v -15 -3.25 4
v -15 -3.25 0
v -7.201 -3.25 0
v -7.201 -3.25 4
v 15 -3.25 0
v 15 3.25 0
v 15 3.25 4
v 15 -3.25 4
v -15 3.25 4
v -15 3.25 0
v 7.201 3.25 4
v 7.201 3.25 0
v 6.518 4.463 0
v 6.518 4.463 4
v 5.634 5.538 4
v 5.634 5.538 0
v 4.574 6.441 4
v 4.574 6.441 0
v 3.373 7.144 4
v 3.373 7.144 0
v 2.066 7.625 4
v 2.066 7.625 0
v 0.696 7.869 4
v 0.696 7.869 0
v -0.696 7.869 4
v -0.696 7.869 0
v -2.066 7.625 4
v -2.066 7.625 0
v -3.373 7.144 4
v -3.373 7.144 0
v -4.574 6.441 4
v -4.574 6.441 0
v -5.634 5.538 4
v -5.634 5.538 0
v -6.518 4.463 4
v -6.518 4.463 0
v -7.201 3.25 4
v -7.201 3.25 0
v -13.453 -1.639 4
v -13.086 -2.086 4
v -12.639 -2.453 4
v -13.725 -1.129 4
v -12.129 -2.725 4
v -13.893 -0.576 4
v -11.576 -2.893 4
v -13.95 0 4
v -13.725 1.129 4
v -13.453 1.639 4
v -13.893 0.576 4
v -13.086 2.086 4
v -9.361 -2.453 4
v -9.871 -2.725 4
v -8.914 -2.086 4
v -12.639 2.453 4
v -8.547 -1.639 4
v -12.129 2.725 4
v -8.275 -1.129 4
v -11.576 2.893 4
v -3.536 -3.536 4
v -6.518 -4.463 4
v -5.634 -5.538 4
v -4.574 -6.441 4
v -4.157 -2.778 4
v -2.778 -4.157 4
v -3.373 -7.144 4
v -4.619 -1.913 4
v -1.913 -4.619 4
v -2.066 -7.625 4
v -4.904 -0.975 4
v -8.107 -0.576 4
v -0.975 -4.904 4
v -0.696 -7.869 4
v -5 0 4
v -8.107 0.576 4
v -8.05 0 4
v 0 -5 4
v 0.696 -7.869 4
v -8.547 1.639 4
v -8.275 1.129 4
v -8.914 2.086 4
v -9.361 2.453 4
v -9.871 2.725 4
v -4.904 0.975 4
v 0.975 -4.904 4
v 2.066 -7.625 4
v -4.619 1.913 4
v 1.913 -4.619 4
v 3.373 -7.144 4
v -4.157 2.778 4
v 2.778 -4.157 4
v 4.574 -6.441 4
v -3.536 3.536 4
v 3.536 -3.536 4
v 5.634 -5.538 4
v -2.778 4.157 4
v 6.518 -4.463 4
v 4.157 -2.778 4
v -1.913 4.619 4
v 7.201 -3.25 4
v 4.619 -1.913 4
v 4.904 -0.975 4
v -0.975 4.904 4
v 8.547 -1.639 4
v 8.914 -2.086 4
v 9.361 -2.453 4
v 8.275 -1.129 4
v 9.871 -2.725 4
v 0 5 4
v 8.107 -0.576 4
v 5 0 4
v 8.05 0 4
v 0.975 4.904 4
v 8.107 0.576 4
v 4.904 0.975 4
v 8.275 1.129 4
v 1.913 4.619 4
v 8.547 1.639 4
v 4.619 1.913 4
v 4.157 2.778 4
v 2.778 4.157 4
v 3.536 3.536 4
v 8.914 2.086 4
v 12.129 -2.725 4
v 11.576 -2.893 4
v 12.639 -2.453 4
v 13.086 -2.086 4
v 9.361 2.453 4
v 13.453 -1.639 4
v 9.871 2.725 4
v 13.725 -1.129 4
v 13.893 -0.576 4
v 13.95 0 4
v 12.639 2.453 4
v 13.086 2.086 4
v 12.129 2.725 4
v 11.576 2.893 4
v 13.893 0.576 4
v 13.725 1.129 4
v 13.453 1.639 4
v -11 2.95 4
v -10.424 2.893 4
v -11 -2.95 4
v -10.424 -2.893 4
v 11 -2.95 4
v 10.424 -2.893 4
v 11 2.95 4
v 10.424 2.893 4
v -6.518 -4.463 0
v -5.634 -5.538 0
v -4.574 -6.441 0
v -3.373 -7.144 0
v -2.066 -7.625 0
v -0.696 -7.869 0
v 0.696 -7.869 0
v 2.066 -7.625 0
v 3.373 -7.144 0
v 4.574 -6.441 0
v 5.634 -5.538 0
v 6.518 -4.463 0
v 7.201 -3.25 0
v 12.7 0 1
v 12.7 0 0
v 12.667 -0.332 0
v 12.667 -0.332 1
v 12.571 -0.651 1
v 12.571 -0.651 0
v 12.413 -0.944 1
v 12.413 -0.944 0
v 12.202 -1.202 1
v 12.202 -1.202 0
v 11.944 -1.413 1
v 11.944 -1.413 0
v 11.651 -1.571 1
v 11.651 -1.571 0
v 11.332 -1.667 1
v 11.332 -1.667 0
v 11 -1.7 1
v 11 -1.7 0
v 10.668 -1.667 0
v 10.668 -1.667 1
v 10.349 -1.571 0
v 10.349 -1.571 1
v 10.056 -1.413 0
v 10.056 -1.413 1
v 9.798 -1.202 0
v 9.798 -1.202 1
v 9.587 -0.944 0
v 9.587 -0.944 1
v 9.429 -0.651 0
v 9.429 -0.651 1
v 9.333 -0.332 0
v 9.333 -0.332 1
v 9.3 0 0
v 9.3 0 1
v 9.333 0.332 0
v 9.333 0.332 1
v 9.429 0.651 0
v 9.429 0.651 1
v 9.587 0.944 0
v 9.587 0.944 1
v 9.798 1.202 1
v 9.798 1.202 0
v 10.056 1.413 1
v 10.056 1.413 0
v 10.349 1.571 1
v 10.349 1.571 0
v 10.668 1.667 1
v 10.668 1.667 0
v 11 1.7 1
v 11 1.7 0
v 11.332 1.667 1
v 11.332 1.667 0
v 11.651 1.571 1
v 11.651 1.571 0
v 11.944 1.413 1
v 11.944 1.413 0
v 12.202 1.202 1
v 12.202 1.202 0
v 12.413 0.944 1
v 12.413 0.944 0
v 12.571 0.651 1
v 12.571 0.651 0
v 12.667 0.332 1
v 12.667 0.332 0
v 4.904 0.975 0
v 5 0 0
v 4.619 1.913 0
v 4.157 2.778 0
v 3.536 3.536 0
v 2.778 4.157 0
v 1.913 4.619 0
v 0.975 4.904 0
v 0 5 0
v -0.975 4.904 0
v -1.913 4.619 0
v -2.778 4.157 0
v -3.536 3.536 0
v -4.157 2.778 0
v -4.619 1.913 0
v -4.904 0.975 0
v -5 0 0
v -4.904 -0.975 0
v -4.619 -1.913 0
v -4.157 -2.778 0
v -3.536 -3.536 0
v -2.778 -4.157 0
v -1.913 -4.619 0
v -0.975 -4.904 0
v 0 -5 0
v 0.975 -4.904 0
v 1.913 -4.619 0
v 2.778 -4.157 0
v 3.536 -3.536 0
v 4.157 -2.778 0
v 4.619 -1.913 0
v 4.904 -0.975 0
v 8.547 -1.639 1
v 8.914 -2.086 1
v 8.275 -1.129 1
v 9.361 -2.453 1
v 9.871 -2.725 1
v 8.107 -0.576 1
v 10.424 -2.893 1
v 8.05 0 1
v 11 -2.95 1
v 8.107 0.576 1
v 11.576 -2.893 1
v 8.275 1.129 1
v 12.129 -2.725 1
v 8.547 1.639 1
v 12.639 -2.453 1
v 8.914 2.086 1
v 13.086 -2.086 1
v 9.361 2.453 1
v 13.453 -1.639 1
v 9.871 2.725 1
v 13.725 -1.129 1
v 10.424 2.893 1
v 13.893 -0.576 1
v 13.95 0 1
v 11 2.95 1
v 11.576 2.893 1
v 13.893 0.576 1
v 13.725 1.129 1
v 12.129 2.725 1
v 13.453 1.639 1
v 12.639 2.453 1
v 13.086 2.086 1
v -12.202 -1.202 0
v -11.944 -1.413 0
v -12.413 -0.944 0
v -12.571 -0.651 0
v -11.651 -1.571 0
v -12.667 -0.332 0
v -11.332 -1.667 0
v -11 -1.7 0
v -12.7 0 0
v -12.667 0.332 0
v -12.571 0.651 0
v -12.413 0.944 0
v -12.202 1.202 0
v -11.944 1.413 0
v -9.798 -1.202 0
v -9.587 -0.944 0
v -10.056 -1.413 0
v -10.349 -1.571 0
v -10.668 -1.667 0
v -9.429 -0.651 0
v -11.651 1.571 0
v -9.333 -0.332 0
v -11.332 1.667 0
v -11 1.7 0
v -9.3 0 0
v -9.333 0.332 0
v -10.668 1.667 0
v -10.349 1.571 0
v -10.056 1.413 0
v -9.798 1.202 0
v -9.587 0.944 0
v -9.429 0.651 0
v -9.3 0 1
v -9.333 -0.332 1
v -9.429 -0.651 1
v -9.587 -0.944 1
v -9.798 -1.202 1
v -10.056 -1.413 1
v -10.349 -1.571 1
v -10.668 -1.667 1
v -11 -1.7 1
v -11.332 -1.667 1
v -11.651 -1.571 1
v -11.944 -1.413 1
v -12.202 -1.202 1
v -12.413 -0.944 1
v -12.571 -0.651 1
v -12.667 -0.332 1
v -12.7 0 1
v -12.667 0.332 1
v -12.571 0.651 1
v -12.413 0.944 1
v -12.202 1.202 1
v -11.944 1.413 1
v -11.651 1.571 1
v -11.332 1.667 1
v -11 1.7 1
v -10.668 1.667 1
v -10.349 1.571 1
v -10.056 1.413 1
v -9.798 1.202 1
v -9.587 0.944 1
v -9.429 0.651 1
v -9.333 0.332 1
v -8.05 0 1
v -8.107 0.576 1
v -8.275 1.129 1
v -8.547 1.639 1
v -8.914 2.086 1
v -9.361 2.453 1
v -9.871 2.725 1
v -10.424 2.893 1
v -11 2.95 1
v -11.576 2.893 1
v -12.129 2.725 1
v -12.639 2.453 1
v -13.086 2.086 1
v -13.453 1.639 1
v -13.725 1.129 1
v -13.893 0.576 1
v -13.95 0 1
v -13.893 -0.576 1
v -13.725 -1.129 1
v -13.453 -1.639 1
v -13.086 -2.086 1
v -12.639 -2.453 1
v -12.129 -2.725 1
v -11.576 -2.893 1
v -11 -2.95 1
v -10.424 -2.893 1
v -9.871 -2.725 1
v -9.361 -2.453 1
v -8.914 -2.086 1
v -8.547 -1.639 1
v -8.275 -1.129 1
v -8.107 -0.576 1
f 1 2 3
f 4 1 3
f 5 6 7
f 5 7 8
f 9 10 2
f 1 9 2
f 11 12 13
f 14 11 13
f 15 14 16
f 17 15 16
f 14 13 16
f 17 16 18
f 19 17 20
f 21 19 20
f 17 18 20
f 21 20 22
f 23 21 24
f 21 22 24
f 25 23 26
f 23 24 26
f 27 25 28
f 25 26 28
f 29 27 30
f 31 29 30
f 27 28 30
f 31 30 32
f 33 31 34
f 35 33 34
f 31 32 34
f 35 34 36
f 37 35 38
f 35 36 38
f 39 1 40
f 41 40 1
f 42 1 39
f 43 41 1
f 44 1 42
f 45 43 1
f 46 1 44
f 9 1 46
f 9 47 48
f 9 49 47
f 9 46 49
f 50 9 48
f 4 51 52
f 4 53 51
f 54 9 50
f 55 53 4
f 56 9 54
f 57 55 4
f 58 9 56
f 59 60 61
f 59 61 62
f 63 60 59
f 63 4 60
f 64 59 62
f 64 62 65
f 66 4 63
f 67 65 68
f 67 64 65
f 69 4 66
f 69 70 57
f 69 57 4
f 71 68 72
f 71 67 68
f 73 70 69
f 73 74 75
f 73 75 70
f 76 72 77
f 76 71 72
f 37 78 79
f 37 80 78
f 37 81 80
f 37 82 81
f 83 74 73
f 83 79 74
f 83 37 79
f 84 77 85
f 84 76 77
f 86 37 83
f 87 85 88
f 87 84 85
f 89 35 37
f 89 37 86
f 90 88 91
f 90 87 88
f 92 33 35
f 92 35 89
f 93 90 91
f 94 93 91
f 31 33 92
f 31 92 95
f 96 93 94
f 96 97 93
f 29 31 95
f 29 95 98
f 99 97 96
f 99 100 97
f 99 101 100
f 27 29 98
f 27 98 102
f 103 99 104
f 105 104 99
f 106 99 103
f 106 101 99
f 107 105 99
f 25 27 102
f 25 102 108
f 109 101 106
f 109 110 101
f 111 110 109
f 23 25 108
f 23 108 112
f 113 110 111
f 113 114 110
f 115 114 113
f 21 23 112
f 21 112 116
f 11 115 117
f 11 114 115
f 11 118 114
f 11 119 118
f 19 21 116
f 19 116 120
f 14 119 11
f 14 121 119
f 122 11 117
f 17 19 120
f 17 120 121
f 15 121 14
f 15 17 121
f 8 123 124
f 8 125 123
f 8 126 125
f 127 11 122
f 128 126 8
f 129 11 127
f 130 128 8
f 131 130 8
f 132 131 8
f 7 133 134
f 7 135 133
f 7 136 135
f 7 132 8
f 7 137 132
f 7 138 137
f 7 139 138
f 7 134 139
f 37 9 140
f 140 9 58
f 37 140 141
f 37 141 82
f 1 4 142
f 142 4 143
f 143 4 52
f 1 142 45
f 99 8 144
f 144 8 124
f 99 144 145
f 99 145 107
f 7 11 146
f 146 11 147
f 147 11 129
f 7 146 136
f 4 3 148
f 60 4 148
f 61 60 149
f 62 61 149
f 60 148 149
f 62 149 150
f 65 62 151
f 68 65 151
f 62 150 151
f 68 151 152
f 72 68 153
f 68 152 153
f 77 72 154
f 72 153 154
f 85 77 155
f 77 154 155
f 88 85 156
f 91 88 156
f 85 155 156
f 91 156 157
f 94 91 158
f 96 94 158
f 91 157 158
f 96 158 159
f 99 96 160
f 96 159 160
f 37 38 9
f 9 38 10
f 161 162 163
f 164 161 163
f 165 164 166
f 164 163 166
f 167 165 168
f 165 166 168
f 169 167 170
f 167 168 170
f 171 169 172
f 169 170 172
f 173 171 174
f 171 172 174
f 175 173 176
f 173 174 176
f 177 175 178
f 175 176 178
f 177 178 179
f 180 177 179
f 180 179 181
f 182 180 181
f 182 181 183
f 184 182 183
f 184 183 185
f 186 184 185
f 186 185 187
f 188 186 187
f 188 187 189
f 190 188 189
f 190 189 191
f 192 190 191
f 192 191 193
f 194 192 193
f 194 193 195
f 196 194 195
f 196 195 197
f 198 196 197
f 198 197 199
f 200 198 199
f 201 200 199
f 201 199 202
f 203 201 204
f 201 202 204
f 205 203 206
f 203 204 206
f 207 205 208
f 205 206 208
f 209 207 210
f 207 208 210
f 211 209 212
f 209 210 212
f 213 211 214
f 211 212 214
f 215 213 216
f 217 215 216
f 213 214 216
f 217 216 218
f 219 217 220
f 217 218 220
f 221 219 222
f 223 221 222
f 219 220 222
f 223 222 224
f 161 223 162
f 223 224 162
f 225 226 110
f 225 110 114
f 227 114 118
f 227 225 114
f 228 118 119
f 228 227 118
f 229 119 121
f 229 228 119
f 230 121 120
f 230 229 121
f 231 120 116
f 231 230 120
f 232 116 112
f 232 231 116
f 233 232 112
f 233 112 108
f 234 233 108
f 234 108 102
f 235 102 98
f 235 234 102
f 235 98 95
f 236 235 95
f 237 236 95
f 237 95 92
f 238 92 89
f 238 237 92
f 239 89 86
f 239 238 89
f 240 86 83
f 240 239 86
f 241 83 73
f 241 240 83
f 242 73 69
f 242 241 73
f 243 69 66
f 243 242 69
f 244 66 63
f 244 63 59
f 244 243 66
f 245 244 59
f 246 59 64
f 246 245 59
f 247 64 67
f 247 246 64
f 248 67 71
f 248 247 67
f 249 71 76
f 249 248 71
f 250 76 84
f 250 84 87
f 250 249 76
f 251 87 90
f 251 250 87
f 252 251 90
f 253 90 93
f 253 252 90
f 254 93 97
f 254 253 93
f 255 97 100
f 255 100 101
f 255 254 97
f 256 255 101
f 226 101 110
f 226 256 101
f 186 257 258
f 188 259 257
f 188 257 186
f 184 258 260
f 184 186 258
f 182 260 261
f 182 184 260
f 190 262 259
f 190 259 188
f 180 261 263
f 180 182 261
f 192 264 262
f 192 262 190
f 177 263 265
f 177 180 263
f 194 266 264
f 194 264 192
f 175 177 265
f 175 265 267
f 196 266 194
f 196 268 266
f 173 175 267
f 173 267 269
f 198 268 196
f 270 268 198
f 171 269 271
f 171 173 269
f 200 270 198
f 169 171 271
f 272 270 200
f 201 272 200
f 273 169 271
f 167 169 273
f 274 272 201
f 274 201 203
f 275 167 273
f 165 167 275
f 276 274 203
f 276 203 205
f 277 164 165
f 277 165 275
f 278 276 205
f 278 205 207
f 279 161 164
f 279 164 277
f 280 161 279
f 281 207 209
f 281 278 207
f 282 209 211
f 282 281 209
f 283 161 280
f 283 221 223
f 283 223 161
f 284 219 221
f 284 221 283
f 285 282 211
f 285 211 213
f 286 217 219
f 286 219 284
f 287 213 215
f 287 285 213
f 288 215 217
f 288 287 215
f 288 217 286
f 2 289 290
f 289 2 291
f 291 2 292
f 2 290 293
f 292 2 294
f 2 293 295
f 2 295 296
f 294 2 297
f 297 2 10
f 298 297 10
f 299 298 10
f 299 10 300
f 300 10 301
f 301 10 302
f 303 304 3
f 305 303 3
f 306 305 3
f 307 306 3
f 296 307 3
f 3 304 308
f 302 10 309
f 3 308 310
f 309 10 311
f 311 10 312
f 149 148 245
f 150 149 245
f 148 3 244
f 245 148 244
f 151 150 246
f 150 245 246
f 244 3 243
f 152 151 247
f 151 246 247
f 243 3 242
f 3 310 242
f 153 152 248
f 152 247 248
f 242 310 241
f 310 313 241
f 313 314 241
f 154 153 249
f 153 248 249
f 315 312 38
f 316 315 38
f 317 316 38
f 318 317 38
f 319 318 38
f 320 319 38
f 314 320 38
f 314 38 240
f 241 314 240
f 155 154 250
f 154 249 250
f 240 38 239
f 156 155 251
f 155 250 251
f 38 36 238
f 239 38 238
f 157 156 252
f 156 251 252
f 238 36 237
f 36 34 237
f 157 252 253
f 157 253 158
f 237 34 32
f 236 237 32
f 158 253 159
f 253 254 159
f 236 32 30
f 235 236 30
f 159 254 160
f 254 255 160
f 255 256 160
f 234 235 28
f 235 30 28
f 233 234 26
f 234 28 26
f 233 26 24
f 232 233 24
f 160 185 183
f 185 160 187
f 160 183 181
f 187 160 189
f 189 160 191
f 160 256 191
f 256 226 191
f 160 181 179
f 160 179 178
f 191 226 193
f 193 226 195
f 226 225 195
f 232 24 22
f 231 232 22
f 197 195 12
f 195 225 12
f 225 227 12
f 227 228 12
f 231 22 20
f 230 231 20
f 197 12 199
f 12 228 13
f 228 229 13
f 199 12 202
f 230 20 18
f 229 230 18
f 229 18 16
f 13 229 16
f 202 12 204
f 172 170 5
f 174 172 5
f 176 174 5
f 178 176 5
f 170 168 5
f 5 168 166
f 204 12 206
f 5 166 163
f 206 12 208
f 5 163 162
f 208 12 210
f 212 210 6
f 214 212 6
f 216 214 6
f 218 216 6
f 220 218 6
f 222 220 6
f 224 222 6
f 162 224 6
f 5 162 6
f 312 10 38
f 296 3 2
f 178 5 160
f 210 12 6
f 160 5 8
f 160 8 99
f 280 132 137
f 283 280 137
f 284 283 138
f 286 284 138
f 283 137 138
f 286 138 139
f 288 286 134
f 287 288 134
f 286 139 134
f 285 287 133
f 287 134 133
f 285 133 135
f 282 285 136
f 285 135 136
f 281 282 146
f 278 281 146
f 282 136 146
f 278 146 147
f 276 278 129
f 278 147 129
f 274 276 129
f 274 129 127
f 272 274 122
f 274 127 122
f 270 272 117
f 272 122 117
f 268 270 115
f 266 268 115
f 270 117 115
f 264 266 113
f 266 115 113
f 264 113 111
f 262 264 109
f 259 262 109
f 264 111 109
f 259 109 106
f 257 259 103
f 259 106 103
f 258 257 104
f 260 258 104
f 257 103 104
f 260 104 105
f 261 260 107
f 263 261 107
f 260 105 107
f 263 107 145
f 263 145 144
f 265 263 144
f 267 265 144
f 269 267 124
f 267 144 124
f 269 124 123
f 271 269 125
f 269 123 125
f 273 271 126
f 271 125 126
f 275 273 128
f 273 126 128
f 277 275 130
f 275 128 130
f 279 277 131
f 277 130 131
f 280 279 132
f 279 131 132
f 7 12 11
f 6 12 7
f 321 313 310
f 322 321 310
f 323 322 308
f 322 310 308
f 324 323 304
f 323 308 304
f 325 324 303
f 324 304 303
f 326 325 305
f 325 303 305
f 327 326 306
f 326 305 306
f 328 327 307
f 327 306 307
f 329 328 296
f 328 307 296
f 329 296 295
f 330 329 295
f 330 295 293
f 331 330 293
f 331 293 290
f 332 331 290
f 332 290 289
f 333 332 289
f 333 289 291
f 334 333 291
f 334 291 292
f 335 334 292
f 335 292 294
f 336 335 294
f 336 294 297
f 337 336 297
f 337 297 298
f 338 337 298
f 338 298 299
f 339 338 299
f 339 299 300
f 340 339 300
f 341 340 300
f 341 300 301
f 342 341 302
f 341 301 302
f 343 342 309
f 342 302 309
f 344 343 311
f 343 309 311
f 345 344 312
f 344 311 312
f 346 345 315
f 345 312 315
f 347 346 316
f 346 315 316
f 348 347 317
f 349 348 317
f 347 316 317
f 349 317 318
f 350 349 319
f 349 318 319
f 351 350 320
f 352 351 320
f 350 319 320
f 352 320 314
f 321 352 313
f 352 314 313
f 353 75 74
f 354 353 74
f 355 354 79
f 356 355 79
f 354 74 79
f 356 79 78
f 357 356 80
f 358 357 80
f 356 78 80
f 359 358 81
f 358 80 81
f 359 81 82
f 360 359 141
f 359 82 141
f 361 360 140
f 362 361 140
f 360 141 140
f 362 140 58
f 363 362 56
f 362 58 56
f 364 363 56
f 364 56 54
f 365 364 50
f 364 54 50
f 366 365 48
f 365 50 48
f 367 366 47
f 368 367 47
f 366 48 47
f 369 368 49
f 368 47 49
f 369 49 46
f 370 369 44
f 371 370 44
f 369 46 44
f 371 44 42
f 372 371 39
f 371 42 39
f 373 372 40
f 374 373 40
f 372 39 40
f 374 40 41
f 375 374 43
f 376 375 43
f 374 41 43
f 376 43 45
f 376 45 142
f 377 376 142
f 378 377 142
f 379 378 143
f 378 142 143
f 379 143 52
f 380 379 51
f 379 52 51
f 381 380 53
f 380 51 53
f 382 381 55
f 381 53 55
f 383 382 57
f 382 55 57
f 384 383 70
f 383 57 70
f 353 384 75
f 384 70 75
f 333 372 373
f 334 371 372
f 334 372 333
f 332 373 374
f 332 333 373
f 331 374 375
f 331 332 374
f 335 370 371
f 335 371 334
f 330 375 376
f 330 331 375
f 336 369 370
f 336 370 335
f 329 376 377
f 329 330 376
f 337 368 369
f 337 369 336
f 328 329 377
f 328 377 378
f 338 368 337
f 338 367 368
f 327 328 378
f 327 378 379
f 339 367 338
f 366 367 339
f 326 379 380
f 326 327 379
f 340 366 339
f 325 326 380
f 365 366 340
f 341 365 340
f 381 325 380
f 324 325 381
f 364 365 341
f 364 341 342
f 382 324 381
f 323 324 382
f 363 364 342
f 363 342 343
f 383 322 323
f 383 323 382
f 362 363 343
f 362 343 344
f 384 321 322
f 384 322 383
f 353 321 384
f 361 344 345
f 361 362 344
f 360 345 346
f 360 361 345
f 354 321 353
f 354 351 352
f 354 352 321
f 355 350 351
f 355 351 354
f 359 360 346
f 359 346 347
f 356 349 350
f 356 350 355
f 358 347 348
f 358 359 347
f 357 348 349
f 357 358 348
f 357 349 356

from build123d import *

# Parameters (mm, degrees)
SKETCH_R        = 5
PAD_DEPTH       = 4
SKETCH001_R     = 1.7
POCKET_DEPTH    = 4.001
SKETCH002_R     = 2.95
POCKET001_DEPTH = 3


with BuildPart() as part:
    # Sketch → Pad (new body)
    with BuildSketch(Plane.XY):
        with BuildLine():
            Line((-7.200521, 3.25), (-15, 3.25))
            Line((-15, 3.25), (-15, -3.25))
            Line((-15, -3.25), (-7.200521, -3.25))
            ThreePointArc((-7.200521, -3.25), (0, -7.9), (7.200521, -3.25))
            Line((15, -3.25), (7.200521, -3.25))
            Line((15, 3.25), (15, -3.25))
            Line((7.200521, 3.25), (15, 3.25))
            ThreePointArc((7.200521, 3.25), (0, 7.9), (-7.200521, 3.25))
        make_face()
        Circle(SKETCH_R, mode=Mode.SUBTRACT)
    extrude(amount=PAD_DEPTH)

    # Sketch001 (on Face10 of Pad) → Pocket (cut, through all)
    with BuildSketch(Plane(origin=(0, 0, 0), x_dir=(1, 0, 0), z_dir=(0, 0, -1))):
        with Locations((11, 0)):
            Circle(SKETCH001_R)
        with Locations((-11, 0)):
            Circle(SKETCH001_R)
    extrude(amount=-POCKET_DEPTH, mode=Mode.SUBTRACT)

    # Sketch002 (on Face5 of Pocket) → Pocket001 (cut)
    with BuildSketch(Plane.XY.offset(4)):
        with Locations((11, 0)):
            Circle(SKETCH002_R)
        with Locations((-11, 0)):
            Circle(SKETCH002_R)
    extrude(amount=-POCKET001_DEPTH, mode=Mode.SUBTRACT)


solid = part.part
